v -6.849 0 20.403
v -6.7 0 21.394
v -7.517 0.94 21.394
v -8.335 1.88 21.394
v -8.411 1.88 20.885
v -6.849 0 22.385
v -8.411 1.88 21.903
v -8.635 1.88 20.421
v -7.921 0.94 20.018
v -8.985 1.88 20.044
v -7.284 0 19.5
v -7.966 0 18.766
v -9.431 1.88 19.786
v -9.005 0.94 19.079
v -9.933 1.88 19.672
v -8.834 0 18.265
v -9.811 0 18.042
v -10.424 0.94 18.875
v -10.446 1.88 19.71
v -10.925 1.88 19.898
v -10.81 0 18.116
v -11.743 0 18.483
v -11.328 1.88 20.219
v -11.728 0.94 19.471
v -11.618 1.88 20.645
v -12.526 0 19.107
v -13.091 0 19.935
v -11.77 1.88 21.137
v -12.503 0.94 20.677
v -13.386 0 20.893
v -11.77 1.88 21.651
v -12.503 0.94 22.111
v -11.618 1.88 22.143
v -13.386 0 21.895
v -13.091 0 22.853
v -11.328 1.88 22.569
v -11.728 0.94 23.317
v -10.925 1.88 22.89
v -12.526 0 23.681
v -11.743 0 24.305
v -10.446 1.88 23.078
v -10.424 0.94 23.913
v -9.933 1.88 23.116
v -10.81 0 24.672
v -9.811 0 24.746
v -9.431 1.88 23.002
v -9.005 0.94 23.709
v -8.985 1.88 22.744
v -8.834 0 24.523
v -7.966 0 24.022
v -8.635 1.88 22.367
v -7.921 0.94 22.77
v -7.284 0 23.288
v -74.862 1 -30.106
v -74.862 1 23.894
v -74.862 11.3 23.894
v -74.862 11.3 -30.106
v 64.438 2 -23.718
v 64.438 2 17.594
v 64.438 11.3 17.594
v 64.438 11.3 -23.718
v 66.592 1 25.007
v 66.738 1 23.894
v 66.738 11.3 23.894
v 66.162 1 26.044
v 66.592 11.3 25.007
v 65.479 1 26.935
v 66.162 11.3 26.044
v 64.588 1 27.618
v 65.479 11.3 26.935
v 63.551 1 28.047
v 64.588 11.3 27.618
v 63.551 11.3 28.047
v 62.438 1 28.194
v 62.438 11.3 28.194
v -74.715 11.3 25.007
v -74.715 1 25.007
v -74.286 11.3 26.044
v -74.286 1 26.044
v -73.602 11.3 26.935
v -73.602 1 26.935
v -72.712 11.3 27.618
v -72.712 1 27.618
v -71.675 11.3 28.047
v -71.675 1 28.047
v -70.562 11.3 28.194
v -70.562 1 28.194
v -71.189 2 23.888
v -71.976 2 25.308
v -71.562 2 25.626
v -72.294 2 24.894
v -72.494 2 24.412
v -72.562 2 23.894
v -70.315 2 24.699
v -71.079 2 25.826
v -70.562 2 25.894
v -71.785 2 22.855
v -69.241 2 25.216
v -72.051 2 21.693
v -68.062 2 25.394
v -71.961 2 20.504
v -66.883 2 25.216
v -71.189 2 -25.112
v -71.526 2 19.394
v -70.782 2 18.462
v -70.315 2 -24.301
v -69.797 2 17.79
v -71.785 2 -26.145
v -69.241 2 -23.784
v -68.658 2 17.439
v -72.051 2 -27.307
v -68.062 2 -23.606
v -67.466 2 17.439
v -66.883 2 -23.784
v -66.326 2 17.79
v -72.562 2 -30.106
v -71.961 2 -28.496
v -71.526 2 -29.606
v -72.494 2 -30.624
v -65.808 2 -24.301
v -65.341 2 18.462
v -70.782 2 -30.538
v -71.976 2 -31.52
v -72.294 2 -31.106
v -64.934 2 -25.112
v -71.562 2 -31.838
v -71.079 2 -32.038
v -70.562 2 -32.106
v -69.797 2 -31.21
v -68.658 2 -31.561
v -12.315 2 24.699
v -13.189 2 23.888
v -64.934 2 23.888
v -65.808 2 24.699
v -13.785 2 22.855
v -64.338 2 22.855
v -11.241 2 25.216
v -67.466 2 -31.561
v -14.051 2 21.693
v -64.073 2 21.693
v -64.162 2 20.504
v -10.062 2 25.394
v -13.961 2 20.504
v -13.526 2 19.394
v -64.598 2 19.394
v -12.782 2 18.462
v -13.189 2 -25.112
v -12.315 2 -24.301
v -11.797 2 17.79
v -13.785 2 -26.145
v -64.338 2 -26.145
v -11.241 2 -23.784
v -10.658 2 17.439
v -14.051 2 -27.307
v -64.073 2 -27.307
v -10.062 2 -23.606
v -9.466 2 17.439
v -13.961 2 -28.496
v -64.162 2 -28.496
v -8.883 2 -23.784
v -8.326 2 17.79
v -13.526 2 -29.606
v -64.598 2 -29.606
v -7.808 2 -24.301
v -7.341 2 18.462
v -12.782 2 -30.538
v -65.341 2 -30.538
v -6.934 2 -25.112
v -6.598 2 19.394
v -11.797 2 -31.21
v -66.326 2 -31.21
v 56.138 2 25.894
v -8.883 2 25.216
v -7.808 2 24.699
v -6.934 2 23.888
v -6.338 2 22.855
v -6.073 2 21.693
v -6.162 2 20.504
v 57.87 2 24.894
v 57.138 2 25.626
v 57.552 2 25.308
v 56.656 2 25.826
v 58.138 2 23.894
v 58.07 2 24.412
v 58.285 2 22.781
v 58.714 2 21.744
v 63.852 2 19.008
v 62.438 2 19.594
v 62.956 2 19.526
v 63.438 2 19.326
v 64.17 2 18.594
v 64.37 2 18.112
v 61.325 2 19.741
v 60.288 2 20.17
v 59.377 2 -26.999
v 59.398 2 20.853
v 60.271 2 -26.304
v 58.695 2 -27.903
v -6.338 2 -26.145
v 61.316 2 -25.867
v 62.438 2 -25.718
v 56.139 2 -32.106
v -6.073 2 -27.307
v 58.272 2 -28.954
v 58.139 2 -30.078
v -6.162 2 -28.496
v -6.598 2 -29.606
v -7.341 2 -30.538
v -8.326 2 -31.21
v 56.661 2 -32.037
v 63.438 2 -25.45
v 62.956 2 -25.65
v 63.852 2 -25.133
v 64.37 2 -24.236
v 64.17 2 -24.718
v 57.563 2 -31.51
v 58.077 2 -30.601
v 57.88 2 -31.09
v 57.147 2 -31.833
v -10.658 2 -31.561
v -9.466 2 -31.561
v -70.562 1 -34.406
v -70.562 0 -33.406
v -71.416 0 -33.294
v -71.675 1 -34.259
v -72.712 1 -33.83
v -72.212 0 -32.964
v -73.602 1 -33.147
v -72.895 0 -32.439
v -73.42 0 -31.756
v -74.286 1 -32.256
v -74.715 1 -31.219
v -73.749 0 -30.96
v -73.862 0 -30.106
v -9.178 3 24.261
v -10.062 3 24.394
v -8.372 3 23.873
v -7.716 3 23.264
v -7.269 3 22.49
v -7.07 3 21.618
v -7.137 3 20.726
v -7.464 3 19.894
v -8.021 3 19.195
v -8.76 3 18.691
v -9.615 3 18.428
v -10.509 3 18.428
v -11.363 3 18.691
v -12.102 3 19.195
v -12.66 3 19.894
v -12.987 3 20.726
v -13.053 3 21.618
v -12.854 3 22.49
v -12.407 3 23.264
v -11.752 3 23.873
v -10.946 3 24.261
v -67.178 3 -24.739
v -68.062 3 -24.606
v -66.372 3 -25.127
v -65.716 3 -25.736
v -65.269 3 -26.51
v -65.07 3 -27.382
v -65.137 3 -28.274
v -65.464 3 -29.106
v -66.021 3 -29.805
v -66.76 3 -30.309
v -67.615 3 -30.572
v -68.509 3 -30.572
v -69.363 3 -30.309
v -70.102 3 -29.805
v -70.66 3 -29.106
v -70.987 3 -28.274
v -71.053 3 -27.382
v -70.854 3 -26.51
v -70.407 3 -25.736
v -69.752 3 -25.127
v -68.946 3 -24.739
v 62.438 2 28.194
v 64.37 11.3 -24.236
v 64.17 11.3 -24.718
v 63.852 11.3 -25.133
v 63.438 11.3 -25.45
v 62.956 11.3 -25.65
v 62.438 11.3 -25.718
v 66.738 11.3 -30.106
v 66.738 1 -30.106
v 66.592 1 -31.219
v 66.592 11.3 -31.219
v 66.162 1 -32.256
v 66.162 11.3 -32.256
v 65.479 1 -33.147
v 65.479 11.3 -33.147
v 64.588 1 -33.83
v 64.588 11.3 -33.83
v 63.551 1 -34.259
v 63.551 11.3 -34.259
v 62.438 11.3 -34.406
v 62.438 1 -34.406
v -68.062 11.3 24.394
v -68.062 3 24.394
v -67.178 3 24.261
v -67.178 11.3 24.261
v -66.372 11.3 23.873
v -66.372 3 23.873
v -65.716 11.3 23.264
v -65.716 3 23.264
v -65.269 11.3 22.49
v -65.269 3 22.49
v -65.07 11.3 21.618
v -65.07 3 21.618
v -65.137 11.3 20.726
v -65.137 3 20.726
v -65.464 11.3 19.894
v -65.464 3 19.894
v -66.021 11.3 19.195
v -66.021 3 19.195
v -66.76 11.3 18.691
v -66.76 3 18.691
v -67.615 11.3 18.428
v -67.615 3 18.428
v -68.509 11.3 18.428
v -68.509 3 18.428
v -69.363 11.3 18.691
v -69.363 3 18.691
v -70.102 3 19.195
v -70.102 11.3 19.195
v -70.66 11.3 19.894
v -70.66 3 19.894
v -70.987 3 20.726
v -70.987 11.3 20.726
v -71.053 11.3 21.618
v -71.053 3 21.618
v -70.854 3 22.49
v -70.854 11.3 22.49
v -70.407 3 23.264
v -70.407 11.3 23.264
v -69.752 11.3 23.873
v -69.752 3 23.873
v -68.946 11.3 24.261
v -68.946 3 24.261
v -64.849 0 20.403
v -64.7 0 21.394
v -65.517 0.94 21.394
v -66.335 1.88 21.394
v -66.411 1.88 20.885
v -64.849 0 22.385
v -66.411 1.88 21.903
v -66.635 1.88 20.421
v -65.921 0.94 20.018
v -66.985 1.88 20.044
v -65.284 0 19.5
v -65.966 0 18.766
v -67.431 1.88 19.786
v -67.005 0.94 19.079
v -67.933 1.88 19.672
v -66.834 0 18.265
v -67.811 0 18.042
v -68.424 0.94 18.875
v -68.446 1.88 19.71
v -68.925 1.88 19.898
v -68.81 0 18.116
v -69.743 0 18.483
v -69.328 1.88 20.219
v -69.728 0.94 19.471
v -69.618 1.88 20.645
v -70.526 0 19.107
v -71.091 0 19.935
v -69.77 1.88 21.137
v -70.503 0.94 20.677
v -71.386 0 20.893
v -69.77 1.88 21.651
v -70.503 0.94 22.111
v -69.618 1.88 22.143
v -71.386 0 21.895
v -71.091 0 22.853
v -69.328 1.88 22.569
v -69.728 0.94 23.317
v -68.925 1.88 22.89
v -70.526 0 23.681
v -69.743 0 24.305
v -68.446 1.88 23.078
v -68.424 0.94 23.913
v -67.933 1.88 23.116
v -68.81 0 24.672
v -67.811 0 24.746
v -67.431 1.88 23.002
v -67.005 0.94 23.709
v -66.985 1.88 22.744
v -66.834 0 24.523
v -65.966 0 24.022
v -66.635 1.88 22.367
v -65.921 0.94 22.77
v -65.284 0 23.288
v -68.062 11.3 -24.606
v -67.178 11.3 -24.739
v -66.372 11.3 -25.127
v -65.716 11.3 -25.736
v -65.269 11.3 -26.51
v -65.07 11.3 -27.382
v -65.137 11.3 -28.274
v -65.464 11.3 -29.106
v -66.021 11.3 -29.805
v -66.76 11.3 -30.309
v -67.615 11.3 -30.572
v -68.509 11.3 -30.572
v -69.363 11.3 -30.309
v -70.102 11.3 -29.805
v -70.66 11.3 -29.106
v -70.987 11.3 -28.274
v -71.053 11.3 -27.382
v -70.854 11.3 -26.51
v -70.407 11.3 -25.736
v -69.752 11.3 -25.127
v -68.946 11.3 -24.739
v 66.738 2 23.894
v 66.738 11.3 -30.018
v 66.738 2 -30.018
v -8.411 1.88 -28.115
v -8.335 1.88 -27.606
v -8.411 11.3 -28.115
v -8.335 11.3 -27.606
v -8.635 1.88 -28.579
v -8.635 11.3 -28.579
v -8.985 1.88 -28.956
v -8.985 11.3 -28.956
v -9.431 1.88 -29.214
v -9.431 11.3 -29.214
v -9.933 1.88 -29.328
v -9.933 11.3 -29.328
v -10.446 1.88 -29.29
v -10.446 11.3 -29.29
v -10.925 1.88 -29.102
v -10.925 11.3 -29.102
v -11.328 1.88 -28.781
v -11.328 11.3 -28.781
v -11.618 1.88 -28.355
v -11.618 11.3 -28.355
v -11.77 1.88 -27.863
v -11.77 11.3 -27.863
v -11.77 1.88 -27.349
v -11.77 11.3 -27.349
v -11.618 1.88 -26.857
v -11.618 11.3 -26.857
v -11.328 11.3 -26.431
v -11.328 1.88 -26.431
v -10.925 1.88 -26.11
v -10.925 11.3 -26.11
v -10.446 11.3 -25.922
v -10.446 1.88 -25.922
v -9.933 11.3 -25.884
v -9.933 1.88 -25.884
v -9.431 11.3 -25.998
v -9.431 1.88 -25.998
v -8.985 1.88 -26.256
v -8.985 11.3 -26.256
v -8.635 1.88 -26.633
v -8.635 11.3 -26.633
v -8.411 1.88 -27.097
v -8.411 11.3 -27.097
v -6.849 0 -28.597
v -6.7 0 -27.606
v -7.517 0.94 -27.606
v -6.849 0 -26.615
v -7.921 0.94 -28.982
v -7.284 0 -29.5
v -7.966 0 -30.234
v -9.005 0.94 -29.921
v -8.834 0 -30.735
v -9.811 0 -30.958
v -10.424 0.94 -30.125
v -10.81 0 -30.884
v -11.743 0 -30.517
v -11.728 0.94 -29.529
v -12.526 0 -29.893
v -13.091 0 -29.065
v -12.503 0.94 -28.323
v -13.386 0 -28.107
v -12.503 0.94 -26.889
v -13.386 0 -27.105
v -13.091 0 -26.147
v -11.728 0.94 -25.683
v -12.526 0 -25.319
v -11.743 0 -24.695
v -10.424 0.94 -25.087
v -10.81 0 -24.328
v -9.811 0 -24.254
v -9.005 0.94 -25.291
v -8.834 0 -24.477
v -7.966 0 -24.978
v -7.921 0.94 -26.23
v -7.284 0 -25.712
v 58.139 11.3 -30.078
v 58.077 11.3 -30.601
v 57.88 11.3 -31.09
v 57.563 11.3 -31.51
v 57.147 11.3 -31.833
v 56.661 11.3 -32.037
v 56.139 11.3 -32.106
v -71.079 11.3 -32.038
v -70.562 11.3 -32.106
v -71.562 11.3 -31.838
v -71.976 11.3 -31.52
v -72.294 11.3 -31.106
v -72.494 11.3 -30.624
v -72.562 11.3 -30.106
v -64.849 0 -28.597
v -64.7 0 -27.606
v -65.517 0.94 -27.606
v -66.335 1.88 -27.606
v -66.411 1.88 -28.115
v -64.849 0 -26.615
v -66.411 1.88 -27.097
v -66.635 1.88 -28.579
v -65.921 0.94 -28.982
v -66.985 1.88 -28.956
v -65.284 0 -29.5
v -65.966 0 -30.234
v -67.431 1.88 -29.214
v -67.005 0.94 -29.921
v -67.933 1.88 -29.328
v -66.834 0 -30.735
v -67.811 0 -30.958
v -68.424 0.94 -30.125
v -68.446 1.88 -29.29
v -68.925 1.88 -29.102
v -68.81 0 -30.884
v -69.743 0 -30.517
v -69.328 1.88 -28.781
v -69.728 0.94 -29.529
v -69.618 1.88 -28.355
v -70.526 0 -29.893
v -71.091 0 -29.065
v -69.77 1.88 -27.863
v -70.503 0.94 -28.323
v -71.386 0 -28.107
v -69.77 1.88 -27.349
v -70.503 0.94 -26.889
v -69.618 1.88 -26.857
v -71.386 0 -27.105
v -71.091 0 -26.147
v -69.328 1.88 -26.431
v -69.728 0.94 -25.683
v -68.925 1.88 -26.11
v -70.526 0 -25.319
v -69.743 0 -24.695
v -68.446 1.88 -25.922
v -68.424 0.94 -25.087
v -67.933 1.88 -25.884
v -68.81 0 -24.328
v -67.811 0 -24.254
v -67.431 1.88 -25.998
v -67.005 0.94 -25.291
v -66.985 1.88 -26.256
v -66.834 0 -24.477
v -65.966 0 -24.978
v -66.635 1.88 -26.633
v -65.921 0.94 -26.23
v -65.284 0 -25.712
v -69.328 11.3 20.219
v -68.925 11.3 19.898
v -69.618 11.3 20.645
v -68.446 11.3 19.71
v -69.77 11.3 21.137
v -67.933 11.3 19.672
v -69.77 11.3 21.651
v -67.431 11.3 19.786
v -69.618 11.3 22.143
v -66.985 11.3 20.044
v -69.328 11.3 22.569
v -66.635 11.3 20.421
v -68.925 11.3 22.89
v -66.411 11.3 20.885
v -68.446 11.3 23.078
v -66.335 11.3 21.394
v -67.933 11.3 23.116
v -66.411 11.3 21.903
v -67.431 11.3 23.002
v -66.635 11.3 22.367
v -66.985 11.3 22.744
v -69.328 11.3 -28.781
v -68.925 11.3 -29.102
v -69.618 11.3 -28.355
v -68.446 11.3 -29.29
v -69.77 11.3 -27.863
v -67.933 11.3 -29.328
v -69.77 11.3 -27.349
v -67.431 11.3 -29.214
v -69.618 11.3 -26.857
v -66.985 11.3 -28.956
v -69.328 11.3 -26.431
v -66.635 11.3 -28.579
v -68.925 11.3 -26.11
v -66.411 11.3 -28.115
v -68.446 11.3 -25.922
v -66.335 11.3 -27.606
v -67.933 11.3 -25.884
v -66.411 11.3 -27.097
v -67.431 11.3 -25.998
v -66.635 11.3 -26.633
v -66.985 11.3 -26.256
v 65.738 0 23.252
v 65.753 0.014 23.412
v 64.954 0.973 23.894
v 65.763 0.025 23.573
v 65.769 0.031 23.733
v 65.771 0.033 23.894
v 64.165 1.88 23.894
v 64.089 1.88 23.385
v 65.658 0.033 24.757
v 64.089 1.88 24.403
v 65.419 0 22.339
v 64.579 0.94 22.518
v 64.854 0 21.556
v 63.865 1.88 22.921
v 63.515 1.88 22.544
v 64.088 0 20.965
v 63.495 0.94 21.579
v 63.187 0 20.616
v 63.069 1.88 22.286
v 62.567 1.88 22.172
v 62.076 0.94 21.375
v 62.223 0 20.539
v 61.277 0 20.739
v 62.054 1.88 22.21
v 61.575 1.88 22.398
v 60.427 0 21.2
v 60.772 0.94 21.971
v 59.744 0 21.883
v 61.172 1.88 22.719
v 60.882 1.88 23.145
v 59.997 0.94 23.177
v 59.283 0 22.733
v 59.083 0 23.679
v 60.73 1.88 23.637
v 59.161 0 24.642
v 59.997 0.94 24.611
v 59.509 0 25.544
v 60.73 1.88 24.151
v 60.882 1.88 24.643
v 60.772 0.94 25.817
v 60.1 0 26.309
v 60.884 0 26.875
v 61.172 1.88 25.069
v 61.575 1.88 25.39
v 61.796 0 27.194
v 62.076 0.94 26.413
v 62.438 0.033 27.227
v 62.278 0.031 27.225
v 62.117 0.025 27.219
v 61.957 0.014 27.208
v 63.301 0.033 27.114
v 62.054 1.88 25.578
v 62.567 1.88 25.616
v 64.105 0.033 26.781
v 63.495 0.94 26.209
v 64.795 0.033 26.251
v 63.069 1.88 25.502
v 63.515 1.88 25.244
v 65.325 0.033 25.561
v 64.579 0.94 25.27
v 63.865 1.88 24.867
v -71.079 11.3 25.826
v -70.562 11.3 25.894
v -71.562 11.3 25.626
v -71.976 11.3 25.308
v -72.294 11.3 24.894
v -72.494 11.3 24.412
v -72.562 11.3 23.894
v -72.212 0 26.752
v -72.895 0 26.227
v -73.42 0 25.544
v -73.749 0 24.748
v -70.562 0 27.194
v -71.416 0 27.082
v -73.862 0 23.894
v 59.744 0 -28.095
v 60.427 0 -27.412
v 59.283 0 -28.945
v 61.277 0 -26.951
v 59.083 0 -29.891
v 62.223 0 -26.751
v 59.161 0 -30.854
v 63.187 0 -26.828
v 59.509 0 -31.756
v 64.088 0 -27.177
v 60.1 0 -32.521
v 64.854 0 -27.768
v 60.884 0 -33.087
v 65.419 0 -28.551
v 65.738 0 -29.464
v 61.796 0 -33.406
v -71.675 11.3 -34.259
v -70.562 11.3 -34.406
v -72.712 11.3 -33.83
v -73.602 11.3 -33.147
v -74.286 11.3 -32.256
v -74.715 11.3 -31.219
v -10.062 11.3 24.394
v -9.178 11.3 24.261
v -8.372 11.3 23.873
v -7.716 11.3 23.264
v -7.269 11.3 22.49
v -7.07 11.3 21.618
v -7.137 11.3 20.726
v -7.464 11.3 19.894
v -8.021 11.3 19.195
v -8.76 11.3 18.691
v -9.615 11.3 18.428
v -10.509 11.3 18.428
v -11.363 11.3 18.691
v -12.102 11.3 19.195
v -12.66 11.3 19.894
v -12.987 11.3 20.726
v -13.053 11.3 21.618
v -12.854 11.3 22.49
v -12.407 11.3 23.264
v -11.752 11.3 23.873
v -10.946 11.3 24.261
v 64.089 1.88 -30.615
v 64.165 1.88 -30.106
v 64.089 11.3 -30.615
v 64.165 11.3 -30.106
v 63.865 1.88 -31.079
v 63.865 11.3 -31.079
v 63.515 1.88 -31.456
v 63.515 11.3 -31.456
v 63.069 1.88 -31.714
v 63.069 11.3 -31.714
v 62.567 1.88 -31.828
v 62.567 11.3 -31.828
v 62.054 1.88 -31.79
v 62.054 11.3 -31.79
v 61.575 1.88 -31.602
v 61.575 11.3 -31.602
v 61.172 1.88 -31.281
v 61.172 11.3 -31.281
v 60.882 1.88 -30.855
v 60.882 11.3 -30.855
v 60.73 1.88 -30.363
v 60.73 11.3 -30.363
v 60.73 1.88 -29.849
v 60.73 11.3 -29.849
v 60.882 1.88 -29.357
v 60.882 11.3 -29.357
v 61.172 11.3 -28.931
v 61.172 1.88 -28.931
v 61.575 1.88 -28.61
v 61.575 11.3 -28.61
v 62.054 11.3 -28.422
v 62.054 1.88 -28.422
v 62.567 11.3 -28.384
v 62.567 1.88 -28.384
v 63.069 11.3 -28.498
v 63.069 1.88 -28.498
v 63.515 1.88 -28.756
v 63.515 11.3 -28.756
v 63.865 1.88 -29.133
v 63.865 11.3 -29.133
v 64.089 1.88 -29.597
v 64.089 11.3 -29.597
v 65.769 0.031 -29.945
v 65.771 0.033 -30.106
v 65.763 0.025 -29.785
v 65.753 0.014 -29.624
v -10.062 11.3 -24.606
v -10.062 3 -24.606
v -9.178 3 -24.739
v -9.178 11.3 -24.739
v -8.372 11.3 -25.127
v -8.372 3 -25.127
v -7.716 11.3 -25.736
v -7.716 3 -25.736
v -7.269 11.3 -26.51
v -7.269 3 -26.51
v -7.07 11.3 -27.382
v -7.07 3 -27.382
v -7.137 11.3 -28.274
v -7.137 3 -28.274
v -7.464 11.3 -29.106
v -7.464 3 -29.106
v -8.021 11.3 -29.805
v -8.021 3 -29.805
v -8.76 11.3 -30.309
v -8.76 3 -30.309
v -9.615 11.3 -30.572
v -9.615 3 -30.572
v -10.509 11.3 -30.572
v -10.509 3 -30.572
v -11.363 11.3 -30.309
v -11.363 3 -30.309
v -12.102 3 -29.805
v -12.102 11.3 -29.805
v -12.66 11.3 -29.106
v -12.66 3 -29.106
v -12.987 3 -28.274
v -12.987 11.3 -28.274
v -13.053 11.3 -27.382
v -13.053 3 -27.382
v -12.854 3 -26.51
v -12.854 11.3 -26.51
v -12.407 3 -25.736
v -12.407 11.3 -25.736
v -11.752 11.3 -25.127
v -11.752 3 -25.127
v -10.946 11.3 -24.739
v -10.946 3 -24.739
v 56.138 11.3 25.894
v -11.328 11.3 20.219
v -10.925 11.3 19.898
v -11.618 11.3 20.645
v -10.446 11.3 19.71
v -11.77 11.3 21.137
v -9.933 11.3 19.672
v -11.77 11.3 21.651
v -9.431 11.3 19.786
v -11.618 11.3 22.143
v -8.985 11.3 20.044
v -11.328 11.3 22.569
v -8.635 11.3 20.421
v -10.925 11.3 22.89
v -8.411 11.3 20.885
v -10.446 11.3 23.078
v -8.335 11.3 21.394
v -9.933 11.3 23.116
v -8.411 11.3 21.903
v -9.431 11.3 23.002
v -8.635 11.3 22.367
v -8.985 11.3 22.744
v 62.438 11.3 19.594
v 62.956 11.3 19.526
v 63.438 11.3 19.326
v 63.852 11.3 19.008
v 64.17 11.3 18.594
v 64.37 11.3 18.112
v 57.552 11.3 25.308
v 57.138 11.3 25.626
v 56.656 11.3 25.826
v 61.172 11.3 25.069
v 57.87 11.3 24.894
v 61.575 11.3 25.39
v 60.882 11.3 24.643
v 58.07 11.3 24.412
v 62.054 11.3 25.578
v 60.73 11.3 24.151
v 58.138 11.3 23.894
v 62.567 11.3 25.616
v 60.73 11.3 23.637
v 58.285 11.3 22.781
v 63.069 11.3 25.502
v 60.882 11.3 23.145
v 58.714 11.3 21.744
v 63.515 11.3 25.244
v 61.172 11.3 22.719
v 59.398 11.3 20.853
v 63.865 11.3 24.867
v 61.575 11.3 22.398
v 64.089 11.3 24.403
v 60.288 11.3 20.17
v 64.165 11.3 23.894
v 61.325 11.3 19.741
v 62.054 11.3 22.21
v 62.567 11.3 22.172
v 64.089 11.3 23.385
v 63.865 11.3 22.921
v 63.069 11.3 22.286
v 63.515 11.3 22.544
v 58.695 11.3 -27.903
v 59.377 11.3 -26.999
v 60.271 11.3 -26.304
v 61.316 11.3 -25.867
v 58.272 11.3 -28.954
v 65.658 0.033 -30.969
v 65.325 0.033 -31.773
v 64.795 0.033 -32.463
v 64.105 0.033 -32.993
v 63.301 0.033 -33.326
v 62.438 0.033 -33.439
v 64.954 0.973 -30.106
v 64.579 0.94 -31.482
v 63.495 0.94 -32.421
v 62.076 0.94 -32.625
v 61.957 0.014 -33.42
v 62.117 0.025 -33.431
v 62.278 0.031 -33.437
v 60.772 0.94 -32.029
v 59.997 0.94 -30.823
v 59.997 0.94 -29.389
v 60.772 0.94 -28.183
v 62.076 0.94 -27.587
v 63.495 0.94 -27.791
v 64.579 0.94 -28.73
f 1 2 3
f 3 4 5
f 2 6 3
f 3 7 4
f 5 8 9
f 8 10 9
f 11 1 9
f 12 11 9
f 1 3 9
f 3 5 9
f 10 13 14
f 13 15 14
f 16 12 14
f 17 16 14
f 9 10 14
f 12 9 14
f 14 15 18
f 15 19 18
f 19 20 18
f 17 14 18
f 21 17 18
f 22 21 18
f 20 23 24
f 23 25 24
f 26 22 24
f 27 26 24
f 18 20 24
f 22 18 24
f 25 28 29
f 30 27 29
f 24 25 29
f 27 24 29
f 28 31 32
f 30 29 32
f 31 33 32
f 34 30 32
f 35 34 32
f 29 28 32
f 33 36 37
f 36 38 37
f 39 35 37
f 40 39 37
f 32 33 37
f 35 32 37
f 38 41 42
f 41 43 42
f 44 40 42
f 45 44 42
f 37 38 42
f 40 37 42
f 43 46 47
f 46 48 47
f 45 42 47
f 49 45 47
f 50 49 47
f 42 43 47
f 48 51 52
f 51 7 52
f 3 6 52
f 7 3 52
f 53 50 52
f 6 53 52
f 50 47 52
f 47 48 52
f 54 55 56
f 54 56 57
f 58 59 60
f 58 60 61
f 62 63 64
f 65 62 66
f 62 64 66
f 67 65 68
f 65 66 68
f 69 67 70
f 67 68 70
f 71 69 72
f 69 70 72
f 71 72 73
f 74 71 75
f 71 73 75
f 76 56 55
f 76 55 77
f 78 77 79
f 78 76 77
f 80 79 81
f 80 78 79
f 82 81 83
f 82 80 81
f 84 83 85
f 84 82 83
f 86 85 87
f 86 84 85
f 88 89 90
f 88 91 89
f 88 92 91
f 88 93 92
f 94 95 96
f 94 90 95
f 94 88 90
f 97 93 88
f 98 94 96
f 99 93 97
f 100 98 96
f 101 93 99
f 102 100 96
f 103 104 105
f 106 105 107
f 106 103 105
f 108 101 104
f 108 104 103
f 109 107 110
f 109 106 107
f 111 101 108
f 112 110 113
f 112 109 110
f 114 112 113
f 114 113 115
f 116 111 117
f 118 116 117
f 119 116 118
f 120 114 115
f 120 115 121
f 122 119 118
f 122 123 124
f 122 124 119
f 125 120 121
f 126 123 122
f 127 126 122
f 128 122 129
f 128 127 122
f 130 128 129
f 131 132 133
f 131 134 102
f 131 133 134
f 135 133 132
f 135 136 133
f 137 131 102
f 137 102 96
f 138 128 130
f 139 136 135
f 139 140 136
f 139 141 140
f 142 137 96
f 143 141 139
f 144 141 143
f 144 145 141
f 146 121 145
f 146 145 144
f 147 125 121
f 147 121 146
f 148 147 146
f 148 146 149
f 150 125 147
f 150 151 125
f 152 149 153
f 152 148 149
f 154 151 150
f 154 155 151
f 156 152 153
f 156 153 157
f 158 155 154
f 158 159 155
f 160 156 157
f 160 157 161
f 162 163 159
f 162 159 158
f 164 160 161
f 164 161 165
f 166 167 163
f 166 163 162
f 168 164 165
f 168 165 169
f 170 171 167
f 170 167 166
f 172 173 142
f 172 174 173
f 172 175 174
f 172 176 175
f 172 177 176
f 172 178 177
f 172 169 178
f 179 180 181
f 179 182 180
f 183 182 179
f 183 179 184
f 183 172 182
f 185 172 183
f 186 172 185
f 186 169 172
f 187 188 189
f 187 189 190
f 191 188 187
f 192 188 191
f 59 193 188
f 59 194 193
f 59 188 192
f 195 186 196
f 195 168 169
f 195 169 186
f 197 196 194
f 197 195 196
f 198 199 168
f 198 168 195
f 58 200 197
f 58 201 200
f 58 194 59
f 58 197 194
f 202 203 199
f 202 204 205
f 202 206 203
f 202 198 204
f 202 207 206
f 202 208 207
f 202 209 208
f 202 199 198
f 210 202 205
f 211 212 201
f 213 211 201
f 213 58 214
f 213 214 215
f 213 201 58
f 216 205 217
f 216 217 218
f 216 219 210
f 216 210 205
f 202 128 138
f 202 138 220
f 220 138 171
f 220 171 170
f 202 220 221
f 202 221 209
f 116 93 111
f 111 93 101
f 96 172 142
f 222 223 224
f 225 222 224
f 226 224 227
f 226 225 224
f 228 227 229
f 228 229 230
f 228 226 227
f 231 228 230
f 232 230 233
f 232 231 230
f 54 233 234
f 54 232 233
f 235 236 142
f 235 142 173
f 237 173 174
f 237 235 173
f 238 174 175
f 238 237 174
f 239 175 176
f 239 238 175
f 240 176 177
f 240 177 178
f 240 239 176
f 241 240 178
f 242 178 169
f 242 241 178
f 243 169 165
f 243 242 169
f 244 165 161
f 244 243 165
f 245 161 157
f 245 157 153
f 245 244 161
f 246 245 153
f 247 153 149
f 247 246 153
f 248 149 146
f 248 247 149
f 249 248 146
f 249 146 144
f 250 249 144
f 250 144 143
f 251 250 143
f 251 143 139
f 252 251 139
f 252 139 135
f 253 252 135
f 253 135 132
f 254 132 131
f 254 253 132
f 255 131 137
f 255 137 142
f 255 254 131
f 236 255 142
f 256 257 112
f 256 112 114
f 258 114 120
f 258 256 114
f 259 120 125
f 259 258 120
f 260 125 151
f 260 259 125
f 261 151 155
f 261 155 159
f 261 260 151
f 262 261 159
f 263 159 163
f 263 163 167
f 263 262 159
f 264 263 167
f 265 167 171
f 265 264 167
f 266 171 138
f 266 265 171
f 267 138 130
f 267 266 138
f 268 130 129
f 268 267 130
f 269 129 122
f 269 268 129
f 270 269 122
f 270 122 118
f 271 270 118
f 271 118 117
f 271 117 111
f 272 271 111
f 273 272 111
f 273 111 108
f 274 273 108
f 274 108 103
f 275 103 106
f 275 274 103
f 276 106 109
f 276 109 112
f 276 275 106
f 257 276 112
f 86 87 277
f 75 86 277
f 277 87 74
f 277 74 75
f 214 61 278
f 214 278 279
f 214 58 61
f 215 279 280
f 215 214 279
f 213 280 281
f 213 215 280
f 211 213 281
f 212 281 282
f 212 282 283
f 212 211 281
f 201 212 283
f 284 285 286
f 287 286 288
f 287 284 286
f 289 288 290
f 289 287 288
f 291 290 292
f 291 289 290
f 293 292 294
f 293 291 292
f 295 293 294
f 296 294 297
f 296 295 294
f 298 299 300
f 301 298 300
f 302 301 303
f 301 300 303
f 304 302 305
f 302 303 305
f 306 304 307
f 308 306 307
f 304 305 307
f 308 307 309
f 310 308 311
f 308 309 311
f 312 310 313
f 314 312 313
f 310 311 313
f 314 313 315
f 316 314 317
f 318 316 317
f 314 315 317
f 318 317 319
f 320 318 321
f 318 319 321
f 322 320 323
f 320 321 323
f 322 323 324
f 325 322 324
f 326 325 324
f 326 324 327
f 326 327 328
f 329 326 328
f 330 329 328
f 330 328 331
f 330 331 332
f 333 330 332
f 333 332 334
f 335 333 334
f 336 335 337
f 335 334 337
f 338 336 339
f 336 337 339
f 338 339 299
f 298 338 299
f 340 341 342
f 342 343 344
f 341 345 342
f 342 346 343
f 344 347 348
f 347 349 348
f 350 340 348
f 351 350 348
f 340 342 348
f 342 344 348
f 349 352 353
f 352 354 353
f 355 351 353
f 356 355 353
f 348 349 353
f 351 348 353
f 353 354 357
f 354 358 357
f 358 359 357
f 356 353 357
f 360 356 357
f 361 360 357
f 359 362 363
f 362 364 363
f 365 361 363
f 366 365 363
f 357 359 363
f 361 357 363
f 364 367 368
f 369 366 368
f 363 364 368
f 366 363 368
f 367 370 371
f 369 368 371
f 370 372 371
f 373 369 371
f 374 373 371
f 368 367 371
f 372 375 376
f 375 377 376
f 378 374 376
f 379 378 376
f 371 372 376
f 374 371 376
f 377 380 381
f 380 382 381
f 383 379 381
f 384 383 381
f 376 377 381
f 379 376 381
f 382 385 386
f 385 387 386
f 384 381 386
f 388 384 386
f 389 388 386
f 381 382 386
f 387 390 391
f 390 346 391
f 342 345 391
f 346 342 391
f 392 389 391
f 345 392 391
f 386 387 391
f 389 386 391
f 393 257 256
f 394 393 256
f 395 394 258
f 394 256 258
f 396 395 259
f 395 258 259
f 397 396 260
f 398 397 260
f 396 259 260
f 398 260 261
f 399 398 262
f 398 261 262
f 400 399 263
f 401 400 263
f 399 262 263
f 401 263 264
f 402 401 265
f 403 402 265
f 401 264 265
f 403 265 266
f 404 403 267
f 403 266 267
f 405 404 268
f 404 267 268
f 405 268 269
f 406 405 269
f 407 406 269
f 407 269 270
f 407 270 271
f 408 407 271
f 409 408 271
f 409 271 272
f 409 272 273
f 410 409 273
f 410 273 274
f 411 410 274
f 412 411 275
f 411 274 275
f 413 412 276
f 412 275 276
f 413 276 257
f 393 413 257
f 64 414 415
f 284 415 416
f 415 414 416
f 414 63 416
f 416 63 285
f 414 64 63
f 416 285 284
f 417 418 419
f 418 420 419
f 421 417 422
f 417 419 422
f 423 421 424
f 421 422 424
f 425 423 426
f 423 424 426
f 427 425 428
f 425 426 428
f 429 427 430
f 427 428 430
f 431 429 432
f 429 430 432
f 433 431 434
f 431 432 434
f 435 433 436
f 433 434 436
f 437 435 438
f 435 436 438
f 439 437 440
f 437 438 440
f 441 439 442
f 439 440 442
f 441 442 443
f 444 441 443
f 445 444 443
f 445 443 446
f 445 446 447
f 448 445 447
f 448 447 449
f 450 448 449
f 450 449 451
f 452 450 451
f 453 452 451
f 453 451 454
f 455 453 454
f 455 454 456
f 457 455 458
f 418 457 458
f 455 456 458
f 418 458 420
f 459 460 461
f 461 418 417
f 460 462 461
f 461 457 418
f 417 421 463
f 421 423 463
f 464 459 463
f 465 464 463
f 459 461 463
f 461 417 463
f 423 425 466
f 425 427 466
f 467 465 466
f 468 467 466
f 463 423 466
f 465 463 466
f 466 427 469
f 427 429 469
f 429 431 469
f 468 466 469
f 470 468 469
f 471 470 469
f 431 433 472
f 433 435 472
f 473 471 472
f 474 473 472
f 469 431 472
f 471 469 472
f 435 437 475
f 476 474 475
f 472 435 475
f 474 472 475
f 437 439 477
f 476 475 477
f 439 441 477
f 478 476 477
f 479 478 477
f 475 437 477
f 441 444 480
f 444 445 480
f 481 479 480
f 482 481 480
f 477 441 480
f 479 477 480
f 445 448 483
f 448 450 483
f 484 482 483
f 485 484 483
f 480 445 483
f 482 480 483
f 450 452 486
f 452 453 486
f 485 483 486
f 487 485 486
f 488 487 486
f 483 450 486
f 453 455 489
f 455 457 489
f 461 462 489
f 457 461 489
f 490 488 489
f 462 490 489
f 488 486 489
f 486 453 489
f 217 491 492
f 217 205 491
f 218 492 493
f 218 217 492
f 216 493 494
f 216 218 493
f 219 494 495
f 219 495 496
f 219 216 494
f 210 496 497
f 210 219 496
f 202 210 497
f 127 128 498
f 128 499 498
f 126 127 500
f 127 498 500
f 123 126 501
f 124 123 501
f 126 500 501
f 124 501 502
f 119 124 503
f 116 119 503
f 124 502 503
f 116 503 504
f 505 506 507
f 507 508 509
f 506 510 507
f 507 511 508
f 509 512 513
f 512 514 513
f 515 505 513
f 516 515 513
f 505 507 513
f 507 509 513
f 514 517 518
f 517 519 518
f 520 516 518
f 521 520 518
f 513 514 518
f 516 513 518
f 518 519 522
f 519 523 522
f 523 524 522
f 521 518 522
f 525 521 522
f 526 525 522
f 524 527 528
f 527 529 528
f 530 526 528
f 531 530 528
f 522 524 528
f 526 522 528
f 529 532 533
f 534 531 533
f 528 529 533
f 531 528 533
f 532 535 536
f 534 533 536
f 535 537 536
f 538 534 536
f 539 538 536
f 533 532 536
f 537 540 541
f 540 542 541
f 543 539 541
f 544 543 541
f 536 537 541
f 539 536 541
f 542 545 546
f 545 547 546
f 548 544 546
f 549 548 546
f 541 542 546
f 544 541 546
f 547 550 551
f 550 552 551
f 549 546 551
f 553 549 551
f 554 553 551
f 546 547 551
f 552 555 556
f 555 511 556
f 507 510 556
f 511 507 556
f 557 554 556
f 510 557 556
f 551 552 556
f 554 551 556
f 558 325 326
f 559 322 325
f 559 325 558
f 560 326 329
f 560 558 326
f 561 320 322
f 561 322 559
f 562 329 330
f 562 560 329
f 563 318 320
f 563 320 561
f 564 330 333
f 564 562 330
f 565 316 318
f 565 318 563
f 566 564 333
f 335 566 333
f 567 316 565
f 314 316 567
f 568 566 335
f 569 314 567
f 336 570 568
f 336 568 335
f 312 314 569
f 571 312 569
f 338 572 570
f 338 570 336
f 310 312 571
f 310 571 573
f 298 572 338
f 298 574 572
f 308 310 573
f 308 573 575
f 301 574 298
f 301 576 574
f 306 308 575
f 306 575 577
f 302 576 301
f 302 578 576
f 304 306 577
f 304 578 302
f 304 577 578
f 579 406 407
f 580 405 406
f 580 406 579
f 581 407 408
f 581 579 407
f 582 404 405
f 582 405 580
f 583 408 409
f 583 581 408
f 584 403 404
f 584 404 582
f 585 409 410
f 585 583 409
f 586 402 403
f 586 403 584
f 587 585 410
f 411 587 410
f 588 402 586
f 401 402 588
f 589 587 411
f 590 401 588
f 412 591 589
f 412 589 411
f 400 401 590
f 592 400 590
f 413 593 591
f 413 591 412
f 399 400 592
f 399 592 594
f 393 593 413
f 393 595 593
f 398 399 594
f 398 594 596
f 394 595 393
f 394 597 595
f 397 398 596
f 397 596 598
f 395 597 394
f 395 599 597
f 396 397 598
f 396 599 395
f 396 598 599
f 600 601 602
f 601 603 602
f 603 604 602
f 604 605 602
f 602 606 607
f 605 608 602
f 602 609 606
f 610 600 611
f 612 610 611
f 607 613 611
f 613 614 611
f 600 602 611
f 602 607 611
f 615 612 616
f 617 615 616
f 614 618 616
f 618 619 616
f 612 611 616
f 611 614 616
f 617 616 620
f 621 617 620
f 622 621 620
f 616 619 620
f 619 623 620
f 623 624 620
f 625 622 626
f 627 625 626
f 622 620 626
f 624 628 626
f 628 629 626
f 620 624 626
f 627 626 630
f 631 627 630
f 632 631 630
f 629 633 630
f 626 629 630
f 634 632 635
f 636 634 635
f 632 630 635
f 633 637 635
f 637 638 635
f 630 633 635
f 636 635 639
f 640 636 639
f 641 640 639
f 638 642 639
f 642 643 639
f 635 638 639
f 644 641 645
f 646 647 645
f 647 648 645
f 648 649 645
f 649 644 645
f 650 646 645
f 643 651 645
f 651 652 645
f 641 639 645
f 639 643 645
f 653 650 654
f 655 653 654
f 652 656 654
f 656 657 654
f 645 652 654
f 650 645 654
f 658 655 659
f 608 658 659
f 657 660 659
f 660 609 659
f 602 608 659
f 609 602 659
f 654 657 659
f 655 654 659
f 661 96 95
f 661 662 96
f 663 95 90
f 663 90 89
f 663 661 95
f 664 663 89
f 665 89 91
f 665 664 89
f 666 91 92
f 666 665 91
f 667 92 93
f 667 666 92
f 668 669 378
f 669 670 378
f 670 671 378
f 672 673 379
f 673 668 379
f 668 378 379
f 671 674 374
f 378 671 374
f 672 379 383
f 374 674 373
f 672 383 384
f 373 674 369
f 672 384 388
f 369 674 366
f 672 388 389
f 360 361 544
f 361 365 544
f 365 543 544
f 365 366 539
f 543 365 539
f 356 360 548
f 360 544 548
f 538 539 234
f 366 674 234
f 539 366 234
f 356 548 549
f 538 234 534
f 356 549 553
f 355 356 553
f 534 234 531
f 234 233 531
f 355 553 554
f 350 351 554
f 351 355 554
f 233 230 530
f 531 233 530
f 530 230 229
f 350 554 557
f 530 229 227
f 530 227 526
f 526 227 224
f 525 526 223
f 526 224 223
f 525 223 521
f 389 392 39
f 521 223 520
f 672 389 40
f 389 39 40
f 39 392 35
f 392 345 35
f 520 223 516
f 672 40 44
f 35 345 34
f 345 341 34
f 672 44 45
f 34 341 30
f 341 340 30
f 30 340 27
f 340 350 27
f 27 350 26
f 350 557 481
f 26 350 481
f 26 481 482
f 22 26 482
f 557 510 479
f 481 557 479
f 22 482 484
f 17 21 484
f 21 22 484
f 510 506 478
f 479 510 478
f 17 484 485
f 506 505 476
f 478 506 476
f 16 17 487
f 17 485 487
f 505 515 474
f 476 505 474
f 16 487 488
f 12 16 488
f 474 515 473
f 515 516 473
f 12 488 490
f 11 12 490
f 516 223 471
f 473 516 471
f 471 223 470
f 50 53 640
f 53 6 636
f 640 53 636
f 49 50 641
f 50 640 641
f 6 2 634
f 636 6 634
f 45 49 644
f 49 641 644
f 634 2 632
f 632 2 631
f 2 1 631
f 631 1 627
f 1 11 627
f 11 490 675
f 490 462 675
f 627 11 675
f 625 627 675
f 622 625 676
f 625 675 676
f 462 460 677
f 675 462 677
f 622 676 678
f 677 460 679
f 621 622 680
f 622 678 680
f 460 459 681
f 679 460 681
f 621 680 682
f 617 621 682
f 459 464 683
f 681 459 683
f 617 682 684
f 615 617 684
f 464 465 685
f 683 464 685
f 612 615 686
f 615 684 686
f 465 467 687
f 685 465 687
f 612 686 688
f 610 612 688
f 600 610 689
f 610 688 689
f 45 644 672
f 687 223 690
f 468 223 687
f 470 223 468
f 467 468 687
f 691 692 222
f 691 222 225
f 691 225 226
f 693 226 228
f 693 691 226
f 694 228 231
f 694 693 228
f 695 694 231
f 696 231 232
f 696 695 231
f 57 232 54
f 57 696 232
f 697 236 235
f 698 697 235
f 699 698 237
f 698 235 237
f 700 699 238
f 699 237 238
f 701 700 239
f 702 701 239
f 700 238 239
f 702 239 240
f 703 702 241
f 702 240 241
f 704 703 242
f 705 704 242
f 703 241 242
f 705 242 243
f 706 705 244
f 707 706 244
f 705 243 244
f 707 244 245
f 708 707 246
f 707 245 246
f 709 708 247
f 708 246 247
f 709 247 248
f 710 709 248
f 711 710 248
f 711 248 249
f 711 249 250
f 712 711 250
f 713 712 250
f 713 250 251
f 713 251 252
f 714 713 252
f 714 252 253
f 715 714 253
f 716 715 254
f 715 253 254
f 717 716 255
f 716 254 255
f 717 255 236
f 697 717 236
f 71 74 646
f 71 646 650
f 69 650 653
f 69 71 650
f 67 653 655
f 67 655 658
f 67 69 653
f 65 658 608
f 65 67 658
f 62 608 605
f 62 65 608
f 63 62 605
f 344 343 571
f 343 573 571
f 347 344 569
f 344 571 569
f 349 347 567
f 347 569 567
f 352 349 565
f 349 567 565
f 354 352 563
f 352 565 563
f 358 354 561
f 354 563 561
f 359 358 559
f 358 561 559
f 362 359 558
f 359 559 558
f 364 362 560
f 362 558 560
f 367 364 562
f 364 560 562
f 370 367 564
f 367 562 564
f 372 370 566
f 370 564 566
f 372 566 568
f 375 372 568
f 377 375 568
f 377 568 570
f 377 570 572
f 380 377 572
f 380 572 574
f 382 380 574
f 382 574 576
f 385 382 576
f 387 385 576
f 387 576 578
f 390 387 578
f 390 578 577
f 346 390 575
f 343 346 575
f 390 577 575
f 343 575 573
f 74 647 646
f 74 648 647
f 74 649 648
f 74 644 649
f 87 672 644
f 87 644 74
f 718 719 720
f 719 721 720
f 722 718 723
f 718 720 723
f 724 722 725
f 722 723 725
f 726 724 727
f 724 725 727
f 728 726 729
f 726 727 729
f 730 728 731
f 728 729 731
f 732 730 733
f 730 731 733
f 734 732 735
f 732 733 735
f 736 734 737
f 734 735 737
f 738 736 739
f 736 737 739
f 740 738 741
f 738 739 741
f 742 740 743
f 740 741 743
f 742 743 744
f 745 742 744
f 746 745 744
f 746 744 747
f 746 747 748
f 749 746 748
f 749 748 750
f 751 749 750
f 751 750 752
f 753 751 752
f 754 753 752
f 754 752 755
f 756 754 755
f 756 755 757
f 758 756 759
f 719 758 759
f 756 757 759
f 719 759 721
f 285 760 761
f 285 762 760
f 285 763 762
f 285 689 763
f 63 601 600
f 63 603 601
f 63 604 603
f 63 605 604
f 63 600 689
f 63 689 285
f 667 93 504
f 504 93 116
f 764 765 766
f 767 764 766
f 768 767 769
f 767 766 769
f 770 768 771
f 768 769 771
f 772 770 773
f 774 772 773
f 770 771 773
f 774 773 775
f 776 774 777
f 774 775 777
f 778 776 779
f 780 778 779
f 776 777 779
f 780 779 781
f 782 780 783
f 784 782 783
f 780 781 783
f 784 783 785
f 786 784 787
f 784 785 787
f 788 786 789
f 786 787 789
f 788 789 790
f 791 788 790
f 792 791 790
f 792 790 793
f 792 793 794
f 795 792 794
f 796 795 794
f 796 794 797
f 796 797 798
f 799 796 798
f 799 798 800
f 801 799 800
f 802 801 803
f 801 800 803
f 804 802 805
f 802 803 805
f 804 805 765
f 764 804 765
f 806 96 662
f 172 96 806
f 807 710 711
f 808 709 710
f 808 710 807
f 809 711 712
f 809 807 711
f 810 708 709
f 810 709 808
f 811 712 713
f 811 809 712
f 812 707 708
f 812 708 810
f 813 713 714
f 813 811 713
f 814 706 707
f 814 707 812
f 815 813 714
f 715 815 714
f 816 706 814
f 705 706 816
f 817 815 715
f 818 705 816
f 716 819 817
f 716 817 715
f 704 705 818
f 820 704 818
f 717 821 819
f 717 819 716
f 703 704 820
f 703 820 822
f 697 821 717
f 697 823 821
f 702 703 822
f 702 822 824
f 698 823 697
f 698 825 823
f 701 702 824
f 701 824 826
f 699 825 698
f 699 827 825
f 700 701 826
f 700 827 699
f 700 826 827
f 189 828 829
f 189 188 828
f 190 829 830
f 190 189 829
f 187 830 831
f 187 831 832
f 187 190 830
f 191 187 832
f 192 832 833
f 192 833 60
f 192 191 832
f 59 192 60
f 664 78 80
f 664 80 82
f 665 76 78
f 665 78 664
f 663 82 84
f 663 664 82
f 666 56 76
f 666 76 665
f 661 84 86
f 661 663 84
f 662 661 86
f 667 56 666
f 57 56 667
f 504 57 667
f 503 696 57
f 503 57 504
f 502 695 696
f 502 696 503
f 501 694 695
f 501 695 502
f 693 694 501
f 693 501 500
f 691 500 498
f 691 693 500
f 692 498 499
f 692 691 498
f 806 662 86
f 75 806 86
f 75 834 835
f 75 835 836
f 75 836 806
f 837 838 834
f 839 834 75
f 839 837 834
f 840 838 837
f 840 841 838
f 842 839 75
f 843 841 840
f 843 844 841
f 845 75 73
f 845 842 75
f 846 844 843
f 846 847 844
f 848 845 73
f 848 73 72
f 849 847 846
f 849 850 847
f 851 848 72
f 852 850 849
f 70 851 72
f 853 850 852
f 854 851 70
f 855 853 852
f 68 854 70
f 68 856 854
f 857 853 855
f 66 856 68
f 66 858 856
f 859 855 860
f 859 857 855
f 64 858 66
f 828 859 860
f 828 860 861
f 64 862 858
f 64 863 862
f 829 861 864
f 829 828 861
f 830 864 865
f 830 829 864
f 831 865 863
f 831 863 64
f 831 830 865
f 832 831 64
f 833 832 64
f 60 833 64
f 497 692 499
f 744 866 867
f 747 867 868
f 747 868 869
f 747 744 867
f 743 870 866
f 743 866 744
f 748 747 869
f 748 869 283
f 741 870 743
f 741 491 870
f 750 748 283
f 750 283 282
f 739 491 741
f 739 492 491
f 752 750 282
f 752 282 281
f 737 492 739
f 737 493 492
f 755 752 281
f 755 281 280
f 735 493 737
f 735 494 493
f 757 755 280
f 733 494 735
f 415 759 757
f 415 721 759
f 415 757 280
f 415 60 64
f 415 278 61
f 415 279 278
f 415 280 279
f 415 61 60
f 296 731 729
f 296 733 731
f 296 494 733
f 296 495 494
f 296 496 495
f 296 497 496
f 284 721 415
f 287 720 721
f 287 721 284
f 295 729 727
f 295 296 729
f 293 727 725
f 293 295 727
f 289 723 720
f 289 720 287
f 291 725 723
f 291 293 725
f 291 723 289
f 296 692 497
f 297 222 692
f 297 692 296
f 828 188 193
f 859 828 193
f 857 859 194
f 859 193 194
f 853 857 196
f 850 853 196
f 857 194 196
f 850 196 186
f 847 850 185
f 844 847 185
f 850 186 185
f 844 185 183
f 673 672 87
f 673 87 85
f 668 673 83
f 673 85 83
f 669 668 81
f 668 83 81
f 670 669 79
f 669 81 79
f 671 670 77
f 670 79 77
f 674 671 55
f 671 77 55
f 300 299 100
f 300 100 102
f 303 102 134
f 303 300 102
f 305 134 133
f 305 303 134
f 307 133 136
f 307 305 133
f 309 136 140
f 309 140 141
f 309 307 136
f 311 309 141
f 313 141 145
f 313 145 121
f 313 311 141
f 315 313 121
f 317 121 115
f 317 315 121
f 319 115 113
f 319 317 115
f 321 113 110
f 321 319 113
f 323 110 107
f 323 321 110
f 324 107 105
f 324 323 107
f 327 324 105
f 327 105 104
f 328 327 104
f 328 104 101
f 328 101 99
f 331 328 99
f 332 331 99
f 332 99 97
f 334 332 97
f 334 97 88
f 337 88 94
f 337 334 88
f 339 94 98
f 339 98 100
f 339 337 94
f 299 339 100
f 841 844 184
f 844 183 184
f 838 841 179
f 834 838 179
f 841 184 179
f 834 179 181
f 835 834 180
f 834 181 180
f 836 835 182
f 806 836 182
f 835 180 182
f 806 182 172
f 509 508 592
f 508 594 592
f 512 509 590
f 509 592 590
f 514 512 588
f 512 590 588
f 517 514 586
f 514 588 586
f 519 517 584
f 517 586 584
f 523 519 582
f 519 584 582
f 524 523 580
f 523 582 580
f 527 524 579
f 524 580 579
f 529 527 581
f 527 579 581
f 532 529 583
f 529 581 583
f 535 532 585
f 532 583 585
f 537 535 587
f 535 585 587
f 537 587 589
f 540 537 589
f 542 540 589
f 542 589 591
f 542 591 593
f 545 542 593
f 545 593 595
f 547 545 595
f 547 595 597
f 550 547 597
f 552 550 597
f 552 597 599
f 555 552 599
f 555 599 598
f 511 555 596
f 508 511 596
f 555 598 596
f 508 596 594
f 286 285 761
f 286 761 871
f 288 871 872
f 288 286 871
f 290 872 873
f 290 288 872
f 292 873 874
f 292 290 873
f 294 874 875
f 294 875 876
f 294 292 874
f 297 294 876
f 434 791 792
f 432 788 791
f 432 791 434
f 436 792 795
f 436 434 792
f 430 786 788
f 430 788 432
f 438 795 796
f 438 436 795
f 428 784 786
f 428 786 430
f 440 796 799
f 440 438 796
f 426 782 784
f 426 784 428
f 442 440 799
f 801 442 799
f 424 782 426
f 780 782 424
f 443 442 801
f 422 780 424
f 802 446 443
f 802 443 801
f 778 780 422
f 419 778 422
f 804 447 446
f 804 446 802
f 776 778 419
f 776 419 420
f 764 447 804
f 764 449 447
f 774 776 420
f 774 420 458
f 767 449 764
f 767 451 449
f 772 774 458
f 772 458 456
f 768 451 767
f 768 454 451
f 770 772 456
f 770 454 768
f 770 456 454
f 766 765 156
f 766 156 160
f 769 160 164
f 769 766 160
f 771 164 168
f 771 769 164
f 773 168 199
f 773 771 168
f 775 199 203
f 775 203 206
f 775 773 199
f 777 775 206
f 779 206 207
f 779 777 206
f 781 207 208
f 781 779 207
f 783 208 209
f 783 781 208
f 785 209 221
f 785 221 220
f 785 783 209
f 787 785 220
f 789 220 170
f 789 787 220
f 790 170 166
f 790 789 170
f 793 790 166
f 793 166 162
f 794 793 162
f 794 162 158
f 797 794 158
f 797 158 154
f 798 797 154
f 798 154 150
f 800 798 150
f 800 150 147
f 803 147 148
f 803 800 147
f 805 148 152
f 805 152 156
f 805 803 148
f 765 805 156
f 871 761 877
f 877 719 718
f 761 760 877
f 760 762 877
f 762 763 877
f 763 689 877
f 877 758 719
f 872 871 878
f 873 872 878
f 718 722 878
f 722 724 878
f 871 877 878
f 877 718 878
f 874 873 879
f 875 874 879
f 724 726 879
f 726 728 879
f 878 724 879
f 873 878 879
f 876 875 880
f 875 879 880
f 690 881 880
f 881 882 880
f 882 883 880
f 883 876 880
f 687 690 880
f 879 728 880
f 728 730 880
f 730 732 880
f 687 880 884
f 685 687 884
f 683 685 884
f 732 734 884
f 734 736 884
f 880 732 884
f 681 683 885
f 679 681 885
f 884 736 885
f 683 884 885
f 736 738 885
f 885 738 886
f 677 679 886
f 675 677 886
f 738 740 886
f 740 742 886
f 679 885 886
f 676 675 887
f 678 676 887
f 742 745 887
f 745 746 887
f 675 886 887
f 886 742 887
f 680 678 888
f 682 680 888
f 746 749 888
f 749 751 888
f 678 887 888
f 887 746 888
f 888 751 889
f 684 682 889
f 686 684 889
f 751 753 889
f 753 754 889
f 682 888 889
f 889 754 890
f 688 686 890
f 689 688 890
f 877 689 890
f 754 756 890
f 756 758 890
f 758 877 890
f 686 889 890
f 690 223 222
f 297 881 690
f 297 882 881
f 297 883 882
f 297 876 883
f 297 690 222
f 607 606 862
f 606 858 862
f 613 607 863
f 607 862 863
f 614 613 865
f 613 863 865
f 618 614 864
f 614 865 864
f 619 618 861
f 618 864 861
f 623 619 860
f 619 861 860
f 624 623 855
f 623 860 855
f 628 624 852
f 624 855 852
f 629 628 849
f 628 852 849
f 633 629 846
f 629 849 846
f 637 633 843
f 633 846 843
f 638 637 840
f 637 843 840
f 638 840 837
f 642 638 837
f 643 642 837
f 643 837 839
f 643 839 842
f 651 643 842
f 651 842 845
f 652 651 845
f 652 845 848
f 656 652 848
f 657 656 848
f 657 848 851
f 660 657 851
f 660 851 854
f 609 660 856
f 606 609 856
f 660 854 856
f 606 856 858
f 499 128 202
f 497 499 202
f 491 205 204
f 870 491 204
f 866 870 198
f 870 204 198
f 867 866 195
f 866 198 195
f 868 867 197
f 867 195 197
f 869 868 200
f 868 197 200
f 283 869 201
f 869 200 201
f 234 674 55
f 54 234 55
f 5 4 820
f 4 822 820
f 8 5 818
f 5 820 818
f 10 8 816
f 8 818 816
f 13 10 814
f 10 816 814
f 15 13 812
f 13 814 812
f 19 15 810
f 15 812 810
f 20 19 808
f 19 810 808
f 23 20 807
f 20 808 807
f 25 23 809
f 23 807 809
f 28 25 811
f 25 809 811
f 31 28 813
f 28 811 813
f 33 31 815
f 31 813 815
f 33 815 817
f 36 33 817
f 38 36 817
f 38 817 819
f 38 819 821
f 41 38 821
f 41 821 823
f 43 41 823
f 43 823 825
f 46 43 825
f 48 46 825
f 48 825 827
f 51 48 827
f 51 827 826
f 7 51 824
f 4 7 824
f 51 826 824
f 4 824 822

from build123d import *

# Parameters (mm, degrees)
SKETCH3_W                                         = 141.6
SKETCH3_H                                         = 62.6
SKETCH3_W_2                                       = 137
SKETCH3_H_2                                       = 58
BOSS_EXTRUDE1_DEPTH                               = 11.3
SKETCH5_W                                         = 137
SKETCH5_H                                         = 58
BOSS_EXTRUDE2_DEPTH                               = 2
SKETCH6_R                                         = 3
BOSS_EXTRUDE3_DEPTH                               = 9.3
FILLET6_R                                         = 2
FILLET8_R                                         = 2
CHAMFER1_SIZE                                     = 1
SKETCH24_R                                        = 4.3
BOSS_EXTRUDE7_DEPTH                               = 9.3
FILLET21_R                                        = 2
FILLET22_R                                        = 2
FILLET20_R                                        = 4.3
CSK_FOR_4_FLAT_HEAD_SOCKET_CAP_SCREW1_D           = 3.4544
CSK_FOR_4_FLAT_HEAD_SOCKET_CAP_SCREW1_DEPTH       = 14
CSK_FOR_4_FLAT_HEAD_SOCKET_CAP_SCREW1_CSINK_D     = 6.723761
CSK_FOR_4_FLAT_HEAD_SOCKET_CAP_SCREW1_CSINK_ANGLE = 82
CSK_FOR_4_FLAT_HEAD_SOCKET_CAP_SCREW1_TIP         = 1.037806461
CHAMFER7_SIZE                                     = 1


# Some blends are built 0.0001 mm under size
with BuildPart() as part:
    # Sketch3 → Boss-Extrude1 (new body)
    with BuildSketch(Plane(origin=(0, 0, 0), x_dir=(1, 0, 0), z_dir=(0, 1, 0))):
        with Locations((-4.061766162, 3.105993834)):
            Rectangle(SKETCH3_W, SKETCH3_H)
        with Locations((-4.061766162, 3.105993834)):
            Rectangle(SKETCH3_W_2, SKETCH3_H_2, mode=Mode.SUBTRACT)
    extrude(amount=BOSS_EXTRUDE1_DEPTH)

    # Sketch5 → Boss-Extrude2 (add)
    with BuildSketch(Plane(origin=(0, 0, 0), x_dir=(1, 0, 0), z_dir=(0, 1, 0))):
        with Locations((-4.061766162, 3.105993834)):
            Rectangle(SKETCH5_W, SKETCH5_H)
    extrude(amount=BOSS_EXTRUDE2_DEPTH)

    # Sketch6 → Boss-Extrude3 (add)
    with BuildSketch(Plane(origin=(0, 2, 0), x_dir=(1, 0, 0), z_dir=(0, 1, 0))):
        with Locations(Location((-68.061766162, 27.605993834, 0), (0, 0, 270))):
            Circle(SKETCH6_R)
        with Locations(Location((-68.061766162, -21.394006166, 0), (0, 0, 270))):
            Circle(SKETCH6_R)
        with Locations(Location((-10.061766162, -21.394006166, 0), (0, 0, 270))):
            Circle(SKETCH6_R)
        with Locations(Location((-10.061766162, 27.605993834, 0), (0, 0, 270))):
            Circle(SKETCH6_R)
    extrude(amount=BOSS_EXTRUDE3_DEPTH)

    # Fillet6
    fillet6_edges = [part.edges().sort_by_distance(p)[0] for p in [
        (64.438233838, 6.65, -32.105993834),
    ]]
    fillet(fillet6_edges, radius=FILLET6_R)

    # Fillet8
    fillet8_edges = [part.edges().sort_by_distance(p)[0] for p in [
        (-72.561766162, 6.65, -32.105993834),
        (-72.561766162, 6.65, 25.894006166),
    ]]
    fillet(fillet8_edges, radius=FILLET8_R)

    # Chamfer1
    chamfer1_edges = [part.edges().sort_by_distance(p)[0] for p in [
        (-68.061766162, 2, -30.605993834),
        (-68.061766162, 2, 18.394006166),
        (-10.061766162, 2, 18.394006166),
        (-10.061766162, 2, -30.605993834),
    ]]
    chamfer(chamfer1_edges, length=CHAMFER1_SIZE)

    # Sketch24 → Boss-Extrude7 (add)
    with BuildSketch(Plane(origin=(0, 2, 0), x_dir=(1, 0, 0), z_dir=(0, 1, 0))):
        with Locations((62.438233838, -23.894006166)):
            Circle(SKETCH24_R)
        with Locations((62.438233838, 30.01834388)):
            Circle(SKETCH24_R)
    extrude(amount=BOSS_EXTRUDE7_DEPTH)

    # Fillet21
    fillet21_edges = [part.edges().sort_by_distance(p)[0] for p in [
        (58.631660576, 6.65, 25.894006166),
    ]]
    fillet(fillet21_edges, radius=FILLET21_R)

    # Fillet22
    fillet22_edges = [part.edges().sort_by_distance(p)[0] for p in [
        (64.438233838, 6.65, -26.211770618),
        (58.679016144, 6.65, -32.105993834),
        (64.438233838, 6.65, 20.087432904),
    ]]
    fillet(fillet22_edges, radius=FILLET22_R)

    # Fillet20
    fillet20_edges = [part.edges().sort_by_distance(p)[0] for p in [
        (-74.861766162, 5.65, -34.405993834),
        (66.738233838, 5.65, -34.405993834),
        (66.738233838, 5.65, 28.194006166),
        (-74.861766162, 5.65, 28.194006166),
    ]]
    fillet(fillet20_edges, radius=FILLET20_R - 0.0001)  # a hair under: the kernel refuses the full size

    # CSK for #4 Flat Head Socket Cap Screw1
    with Locations(Plane(origin=(0, 0, 0), x_dir=(-1, 0, 0), z_dir=(0, -1, 0))):
        with Locations((68.061766162, 27.605993834), (68.061766162, -21.394006166), (-62.438233838, 30.105993834), (-62.438233838, -23.894006166), (10.061766162, -21.394006166), (10.061766162, 27.605993834)):
            CounterSinkHole(CSK_FOR_4_FLAT_HEAD_SOCKET_CAP_SCREW1_D / 2, CSK_FOR_4_FLAT_HEAD_SOCKET_CAP_SCREW1_CSINK_D / 2, depth=CSK_FOR_4_FLAT_HEAD_SOCKET_CAP_SCREW1_DEPTH, counter_sink_angle=CSK_FOR_4_FLAT_HEAD_SOCKET_CAP_SCREW1_CSINK_ANGLE)
            with Locations((0, 0, -(CSK_FOR_4_FLAT_HEAD_SOCKET_CAP_SCREW1_DEPTH + CSK_FOR_4_FLAT_HEAD_SOCKET_CAP_SCREW1_TIP / 2))):  # 118° drill point
                Cone(0, CSK_FOR_4_FLAT_HEAD_SOCKET_CAP_SCREW1_D / 2, CSK_FOR_4_FLAT_HEAD_SOCKET_CAP_SCREW1_TIP, mode=Mode.SUBTRACT)

    # Chamfer7
    # the kernel refuses this chamfer: 1 mm, written as the material it takes off along each edge
    with BuildSketch(Plane(origin=(62.438333838, 0, -34.405993834), x_dir=(0, -0.027495876610586292, 0.9996219169112968), z_dir=(-1, 0, 0)), Plane(origin=(-70.561866162, 0, 28.194006166), x_dir=(0, -0.02749587661058639, -0.9996219169112968), z_dir=(1, 0, 0))) as chamfer7_piece_1:
        Polygon((CHAMFER7_SIZE * 0.999621916911, CHAMFER7_SIZE * 0.0274958766106), (-CHAMFER7_SIZE * 0.0274958766106, CHAMFER7_SIZE * 0.999621916911), (0, 0), align=None)
    extrude(amount=133.0002, mode=Mode.SUBTRACT)
    with BuildSketch(Plane(origin=(-74.861766162, 0, -30.106093834), x_dir=(0.9996219169112968, -0.027495876610586483, 0), z_dir=(0, 0, 1)), Plane(origin=(66.738233838, 0, 23.894106166), x_dir=(-0.9996219169112968, -0.027495876610586483, 0), z_dir=(0, 0, -1))) as chamfer7_piece_2:
        Polygon((CHAMFER7_SIZE * 0.999621916911, CHAMFER7_SIZE * 0.0274958766106), (-CHAMFER7_SIZE * 0.0274958766106, CHAMFER7_SIZE * 0.999621916911), (0, 0), align=None)
    extrude(amount=54.0002, mode=Mode.SUBTRACT)
    with BuildSketch(Plane(origin=(62.438333838, 0, 23.894106166), x_dir=(0, 0, 1), z_dir=(-1, 0, 0))) as chamfer7_piece_3:
        Polygon((4.2999 - CHAMFER7_SIZE, 0), (4.2999, CHAMFER7_SIZE), (4.2999, 0), align=None)
    revolve(axis=Axis((62.438333838, 0, 23.894106166), (0, 1, 0)), revolution_arc=90, mode=Mode.SUBTRACT)
    with BuildSketch(Plane(origin=(-70.561866162, 0, 23.894106166), x_dir=(0, 0, 1), z_dir=(1, 0, 0))) as chamfer7_piece_4:
        Polygon((4.2999 - CHAMFER7_SIZE, 0), (4.2999, -CHAMFER7_SIZE), (4.2999, 0), align=None)
    revolve(axis=Axis((-70.561866162, 0, 23.894106166), (0, -1, 0)), revolution_arc=90, mode=Mode.SUBTRACT)
    with BuildSketch(Plane(origin=(-70.561866162, 0, -30.106093834), x_dir=(0, 0, -1), z_dir=(1, 0, 0))) as chamfer7_piece_5:
        Polygon((4.2999 - CHAMFER7_SIZE, 0), (4.2999, CHAMFER7_SIZE), (4.2999, 0), align=None)
    revolve(axis=Axis((-70.561866162, 0, -30.106093834), (0, 1, 0)), revolution_arc=90, mode=Mode.SUBTRACT)
    with BuildSketch(Plane(origin=(62.438333838, 0, -30.106093834), x_dir=(1, 0, 0), z_dir=(0, 0, 1))) as chamfer7_piece_6:
        Polygon((4.2999 - CHAMFER7_SIZE, 0), (4.2999, CHAMFER7_SIZE), (4.2999, 0), align=None)
    revolve(axis=Axis((62.438333838, 0, -30.106093834), (0, 1, 0)), revolution_arc=90, mode=Mode.SUBTRACT)


solid = part.part
